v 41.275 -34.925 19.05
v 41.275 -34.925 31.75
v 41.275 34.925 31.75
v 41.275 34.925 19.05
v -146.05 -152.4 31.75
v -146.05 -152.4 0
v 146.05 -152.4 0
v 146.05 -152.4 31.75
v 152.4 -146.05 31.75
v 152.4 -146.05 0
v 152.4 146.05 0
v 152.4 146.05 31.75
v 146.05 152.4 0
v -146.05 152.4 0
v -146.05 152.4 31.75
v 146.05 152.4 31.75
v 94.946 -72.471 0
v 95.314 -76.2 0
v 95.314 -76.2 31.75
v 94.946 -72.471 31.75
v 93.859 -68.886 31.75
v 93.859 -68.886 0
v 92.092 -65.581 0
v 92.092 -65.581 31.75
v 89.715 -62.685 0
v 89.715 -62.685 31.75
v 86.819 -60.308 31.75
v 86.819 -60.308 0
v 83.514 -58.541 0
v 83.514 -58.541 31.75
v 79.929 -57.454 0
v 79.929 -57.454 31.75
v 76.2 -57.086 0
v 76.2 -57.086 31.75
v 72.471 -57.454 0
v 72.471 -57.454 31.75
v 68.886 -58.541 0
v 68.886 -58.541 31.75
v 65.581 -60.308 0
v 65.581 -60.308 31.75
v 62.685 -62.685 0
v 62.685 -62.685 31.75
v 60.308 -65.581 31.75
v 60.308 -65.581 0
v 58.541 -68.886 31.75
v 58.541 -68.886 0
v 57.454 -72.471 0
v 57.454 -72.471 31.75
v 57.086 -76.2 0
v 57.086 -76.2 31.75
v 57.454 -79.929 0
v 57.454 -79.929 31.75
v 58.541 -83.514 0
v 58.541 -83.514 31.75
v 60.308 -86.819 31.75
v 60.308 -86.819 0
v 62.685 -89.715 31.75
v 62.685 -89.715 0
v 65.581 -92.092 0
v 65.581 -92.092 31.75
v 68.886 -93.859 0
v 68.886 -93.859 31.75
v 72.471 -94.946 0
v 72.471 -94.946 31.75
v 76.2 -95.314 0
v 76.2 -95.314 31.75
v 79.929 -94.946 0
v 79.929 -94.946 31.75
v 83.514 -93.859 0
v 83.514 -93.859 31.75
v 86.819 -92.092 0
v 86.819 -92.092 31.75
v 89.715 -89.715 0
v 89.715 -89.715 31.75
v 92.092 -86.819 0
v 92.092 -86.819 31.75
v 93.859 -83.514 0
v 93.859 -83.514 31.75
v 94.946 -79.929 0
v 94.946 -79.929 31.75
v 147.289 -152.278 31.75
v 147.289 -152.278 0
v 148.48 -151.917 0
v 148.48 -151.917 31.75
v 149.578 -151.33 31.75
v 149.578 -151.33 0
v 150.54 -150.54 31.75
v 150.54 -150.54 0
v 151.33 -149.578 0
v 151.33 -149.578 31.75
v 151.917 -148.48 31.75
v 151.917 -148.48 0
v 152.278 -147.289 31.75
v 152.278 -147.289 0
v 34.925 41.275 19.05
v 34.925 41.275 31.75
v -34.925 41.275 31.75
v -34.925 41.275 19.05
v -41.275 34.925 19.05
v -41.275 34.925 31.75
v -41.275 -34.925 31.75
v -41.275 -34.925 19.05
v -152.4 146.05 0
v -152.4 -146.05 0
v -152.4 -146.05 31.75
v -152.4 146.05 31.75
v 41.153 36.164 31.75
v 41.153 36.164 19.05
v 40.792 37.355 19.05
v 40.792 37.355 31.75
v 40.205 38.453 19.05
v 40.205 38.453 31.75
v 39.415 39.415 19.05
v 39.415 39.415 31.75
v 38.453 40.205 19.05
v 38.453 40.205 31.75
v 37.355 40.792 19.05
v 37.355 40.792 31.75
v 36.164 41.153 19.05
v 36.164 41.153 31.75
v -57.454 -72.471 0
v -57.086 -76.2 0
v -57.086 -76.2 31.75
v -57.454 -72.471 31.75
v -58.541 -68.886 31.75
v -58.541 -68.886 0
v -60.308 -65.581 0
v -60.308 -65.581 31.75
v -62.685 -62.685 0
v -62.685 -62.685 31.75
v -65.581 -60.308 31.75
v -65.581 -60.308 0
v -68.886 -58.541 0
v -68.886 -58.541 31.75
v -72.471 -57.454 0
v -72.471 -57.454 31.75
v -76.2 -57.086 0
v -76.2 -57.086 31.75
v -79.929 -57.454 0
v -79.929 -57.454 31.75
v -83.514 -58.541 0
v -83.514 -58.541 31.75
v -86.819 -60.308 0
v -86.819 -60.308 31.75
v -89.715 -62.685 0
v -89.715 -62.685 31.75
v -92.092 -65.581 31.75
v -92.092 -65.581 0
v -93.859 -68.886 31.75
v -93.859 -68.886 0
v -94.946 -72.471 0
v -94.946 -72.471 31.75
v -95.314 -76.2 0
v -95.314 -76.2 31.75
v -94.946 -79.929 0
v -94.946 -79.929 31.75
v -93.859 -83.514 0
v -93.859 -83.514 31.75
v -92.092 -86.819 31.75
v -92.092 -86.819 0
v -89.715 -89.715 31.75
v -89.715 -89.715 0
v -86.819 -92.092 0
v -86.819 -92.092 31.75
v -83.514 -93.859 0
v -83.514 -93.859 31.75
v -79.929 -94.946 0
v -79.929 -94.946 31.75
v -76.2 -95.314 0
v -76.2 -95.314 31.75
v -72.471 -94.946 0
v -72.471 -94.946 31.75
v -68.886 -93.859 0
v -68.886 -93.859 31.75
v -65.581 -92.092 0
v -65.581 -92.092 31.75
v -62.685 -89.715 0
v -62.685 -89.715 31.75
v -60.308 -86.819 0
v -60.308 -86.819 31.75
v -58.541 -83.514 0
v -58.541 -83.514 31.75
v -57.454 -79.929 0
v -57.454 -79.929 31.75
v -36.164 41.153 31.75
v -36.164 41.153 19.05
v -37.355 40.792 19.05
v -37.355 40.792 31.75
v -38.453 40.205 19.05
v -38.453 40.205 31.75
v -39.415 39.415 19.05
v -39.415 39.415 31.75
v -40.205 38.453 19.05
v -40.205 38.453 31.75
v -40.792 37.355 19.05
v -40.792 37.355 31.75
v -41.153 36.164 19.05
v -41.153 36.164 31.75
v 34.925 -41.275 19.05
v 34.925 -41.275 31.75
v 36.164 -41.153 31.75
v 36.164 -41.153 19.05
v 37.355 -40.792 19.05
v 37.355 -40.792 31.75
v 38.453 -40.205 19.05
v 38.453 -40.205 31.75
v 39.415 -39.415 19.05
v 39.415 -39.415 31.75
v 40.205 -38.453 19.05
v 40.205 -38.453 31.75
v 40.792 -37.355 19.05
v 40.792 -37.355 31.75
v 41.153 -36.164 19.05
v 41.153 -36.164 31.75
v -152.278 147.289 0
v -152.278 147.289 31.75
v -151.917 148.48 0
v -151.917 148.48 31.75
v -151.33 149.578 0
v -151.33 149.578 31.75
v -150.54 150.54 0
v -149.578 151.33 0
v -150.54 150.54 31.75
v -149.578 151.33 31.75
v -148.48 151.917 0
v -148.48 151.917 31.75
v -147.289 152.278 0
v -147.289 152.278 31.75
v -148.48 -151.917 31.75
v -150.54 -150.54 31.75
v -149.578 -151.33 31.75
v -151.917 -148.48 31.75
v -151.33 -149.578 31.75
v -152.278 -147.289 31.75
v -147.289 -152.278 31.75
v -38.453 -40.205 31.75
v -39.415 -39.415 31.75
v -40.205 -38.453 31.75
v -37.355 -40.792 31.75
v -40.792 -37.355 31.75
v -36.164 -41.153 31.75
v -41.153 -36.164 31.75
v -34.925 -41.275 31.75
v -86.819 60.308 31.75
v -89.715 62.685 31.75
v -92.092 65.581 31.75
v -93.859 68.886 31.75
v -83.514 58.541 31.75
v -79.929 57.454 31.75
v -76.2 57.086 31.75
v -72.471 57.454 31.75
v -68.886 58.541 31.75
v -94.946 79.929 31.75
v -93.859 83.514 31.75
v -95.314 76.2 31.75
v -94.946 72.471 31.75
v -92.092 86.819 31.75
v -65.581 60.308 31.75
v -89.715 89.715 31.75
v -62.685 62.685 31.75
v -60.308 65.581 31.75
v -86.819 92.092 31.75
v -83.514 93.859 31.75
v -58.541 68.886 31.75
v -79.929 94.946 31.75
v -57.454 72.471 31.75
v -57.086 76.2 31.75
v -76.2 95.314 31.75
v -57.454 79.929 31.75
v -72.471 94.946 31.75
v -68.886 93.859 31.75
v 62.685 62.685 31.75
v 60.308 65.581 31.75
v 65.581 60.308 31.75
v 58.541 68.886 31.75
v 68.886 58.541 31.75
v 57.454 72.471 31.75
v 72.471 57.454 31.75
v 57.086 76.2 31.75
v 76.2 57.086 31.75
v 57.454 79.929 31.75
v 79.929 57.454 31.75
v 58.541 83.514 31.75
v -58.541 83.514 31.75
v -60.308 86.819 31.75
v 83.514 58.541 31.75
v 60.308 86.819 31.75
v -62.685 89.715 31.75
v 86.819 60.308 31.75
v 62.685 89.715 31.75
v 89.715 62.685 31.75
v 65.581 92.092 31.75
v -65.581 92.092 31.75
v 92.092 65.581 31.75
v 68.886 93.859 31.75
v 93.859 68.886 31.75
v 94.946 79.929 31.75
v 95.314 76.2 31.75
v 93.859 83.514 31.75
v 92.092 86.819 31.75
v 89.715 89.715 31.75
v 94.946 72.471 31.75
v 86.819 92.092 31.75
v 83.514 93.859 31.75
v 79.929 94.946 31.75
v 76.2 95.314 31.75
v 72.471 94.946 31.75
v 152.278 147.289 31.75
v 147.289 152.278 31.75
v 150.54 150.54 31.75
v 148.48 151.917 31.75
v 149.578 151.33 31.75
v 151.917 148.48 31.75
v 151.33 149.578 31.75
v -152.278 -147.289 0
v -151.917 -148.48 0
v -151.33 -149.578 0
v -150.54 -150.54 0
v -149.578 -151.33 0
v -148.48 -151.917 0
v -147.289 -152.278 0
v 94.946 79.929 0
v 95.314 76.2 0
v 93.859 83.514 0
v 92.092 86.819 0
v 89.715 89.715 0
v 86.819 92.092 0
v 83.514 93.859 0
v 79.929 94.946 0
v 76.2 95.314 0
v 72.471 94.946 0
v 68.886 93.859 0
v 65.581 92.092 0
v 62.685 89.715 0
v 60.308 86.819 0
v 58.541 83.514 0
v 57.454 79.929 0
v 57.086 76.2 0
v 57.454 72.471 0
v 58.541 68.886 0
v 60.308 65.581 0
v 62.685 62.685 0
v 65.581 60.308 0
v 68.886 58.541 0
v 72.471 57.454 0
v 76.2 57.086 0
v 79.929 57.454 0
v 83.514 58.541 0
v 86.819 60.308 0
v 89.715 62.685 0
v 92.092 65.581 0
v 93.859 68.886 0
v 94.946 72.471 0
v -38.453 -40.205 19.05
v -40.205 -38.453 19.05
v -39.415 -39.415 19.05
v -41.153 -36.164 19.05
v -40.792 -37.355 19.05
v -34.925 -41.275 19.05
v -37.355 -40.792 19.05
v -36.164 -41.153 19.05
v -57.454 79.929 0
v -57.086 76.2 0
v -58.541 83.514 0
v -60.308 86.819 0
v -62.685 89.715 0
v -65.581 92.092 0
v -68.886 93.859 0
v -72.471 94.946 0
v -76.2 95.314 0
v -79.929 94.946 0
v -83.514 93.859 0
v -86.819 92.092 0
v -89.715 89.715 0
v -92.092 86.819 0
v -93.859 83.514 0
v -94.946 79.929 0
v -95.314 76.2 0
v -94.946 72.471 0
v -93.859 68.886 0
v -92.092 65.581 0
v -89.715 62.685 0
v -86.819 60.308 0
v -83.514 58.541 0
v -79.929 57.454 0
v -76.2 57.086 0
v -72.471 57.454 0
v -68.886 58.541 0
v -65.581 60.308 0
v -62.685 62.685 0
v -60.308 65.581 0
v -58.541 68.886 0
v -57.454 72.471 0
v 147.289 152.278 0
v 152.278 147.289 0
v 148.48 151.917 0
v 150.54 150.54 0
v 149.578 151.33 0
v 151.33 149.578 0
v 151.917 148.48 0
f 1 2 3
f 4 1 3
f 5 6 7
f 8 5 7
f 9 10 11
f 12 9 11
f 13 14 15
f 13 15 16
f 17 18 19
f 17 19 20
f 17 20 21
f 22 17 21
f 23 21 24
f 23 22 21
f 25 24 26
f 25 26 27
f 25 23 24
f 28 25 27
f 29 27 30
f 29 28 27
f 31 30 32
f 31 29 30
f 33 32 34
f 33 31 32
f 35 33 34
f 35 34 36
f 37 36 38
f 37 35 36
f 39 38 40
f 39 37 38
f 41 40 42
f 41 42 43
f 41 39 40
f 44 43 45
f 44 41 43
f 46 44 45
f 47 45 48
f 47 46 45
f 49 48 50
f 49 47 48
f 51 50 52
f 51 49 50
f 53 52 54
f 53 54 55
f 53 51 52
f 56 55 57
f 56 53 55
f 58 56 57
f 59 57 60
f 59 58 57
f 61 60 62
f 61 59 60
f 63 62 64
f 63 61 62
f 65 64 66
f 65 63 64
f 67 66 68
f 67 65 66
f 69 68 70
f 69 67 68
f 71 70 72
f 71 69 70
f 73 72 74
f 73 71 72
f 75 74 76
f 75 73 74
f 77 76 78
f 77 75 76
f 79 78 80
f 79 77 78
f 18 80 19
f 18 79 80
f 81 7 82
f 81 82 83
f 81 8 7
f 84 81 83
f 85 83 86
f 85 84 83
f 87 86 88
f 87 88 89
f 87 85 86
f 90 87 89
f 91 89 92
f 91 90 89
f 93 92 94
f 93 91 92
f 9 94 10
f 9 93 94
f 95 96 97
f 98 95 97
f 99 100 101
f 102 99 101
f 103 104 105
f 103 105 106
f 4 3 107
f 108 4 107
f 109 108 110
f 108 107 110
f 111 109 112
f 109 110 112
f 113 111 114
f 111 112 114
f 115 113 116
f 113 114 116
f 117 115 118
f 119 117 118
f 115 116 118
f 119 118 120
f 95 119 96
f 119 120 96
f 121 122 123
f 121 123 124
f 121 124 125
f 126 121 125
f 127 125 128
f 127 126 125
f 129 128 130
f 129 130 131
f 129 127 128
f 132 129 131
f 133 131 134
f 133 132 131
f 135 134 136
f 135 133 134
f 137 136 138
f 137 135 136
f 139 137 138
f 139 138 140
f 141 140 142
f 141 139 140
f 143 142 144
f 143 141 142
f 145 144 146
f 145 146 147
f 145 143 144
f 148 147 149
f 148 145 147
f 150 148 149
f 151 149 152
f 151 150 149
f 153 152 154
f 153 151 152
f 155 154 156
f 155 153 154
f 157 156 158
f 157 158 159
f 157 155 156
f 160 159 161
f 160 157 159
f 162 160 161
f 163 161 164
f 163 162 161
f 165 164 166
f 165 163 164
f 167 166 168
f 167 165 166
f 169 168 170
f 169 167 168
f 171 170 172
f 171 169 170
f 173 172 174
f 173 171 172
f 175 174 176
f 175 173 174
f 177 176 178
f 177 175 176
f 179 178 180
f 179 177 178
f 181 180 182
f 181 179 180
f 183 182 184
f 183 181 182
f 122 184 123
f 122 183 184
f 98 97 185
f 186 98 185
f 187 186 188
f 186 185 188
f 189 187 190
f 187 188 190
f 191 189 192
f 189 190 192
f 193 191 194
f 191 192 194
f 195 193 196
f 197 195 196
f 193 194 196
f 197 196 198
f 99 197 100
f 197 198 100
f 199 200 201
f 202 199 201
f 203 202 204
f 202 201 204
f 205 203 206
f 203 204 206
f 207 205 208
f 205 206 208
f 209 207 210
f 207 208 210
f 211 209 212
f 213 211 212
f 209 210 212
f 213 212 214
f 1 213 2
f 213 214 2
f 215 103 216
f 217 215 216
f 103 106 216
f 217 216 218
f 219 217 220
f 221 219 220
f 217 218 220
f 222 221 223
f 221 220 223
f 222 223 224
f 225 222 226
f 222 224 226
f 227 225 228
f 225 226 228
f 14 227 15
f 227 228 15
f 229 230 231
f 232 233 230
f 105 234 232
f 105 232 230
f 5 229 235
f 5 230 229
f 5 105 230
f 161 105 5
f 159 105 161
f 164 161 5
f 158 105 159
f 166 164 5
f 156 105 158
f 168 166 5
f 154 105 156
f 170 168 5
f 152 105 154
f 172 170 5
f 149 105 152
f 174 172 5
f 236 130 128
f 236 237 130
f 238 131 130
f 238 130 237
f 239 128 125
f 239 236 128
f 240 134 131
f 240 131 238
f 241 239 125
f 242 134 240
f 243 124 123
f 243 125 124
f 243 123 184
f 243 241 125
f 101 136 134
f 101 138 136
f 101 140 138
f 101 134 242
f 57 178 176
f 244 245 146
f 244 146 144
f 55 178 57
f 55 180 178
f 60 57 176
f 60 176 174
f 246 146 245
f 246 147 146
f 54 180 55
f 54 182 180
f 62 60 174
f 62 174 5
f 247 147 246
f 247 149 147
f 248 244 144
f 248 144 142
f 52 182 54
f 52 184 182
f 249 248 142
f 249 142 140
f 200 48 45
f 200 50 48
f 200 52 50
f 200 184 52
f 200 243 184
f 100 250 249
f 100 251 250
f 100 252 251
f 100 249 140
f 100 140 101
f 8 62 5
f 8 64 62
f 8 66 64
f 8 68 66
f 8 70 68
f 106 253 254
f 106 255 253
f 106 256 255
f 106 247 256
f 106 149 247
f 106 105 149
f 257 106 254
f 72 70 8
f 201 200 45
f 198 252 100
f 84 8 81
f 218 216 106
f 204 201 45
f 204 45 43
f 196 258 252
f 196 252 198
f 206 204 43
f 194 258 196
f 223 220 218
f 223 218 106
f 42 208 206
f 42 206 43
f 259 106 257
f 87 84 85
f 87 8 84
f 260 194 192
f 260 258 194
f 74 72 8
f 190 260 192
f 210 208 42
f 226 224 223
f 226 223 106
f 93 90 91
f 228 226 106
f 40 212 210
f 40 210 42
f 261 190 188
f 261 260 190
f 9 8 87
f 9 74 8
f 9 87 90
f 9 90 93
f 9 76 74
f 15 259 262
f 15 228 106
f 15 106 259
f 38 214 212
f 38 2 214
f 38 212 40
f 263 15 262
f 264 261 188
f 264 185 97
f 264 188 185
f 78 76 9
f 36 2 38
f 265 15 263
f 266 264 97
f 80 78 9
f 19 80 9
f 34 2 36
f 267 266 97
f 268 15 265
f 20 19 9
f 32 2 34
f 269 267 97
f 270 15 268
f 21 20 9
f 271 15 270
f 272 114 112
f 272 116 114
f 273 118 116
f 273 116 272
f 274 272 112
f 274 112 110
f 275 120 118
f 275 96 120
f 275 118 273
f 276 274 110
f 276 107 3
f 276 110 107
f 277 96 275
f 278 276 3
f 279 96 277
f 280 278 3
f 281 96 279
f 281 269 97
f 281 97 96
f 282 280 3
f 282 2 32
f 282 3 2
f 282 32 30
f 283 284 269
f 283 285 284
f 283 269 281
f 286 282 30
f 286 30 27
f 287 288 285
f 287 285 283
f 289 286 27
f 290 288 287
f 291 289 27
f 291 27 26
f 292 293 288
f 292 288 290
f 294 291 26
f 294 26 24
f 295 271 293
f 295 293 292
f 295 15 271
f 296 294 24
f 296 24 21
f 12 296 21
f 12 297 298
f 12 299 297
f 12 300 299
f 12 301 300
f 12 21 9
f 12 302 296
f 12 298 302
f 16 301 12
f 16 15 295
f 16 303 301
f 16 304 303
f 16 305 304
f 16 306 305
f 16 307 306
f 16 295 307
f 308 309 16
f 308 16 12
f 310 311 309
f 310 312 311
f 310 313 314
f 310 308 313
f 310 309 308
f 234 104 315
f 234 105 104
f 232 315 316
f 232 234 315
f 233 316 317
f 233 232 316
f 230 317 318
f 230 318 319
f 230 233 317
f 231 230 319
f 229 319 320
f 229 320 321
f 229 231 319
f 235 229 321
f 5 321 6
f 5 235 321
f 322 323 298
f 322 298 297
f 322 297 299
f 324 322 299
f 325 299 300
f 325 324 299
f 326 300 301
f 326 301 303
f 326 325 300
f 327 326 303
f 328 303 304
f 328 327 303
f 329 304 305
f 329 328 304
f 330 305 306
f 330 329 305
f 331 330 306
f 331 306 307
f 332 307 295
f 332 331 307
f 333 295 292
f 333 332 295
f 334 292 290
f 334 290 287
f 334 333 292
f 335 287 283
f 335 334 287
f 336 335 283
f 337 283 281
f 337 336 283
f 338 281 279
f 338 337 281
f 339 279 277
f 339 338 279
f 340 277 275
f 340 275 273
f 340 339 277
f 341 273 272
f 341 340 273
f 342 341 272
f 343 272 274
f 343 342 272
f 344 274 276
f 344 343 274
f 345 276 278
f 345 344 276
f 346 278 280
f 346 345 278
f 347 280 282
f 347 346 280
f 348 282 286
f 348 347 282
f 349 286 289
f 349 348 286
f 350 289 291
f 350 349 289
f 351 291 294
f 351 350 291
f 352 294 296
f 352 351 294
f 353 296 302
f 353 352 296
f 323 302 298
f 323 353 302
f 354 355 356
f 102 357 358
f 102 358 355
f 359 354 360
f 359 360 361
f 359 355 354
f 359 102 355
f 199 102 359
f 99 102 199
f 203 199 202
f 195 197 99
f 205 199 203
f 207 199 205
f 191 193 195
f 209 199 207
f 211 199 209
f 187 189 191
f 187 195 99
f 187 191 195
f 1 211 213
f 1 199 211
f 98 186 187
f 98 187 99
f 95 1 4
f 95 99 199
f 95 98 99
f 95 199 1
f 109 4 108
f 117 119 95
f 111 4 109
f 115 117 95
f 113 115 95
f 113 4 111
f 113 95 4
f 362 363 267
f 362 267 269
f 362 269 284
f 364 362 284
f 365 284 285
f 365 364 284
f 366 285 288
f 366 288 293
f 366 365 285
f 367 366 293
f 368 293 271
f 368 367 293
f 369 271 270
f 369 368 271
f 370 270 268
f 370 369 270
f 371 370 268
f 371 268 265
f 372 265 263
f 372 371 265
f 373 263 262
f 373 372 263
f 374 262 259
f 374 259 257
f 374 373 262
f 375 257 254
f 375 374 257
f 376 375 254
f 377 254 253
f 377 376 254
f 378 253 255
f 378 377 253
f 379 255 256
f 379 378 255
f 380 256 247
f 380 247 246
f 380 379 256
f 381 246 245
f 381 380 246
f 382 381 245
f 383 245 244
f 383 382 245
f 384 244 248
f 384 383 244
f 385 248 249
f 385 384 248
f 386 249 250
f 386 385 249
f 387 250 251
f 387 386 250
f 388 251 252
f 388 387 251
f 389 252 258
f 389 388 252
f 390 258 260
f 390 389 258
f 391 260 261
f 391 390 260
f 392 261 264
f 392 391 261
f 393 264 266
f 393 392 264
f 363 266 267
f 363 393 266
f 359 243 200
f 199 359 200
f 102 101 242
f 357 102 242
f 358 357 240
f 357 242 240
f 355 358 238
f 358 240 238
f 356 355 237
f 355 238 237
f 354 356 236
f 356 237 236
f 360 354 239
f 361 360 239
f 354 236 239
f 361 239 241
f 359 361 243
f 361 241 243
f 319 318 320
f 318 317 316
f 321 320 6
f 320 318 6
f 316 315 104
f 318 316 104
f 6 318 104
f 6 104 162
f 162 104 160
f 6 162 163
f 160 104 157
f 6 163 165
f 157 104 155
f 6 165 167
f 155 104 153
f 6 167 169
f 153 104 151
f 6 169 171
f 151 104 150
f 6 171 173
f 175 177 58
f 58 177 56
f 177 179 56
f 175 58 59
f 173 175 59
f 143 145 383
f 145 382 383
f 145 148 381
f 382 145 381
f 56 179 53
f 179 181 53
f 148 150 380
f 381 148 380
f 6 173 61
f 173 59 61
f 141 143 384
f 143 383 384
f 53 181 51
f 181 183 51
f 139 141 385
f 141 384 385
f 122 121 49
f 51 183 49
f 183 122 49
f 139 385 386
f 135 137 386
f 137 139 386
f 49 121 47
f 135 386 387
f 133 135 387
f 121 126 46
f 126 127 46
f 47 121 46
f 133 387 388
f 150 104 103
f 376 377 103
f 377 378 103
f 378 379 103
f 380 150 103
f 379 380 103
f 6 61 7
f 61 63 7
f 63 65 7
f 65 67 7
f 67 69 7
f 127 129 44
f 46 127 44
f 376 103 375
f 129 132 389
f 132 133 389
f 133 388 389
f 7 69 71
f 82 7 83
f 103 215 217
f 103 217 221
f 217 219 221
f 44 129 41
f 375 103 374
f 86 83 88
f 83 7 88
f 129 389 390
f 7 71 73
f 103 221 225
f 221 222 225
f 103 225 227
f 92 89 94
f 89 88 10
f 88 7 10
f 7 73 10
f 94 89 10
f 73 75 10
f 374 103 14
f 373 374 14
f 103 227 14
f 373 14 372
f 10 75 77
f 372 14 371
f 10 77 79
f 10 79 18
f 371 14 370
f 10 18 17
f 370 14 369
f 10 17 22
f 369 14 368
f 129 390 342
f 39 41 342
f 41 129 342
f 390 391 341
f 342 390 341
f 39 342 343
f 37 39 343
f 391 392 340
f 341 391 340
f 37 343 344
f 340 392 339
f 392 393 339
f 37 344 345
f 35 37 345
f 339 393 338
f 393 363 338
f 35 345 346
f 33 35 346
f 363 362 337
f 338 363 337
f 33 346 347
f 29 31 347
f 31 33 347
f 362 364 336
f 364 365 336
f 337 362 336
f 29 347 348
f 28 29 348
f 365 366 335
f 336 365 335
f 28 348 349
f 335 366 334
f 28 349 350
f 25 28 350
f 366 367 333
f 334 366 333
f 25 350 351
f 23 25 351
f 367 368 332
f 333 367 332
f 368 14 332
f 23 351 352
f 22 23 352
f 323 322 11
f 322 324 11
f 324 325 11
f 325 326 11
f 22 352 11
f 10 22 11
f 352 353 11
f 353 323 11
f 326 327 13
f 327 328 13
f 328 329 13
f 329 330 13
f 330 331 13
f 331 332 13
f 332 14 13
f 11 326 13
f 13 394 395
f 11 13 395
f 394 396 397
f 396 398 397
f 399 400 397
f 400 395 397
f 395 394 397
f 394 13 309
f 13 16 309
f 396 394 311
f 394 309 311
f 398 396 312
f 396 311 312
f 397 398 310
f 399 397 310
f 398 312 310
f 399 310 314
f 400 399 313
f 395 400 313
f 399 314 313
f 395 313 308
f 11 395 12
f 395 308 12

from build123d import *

# Parameters (mm, degrees)
F0_W     = 304.8
F0_H     = 304.8
F0_R     = 19.1135
F1_DEPTH = 31.75
F3_DEPTH = 12.7
F4_R     = 6.35


with BuildPart() as f1:
    # F0 (on Top) → F1 (new body)
    with BuildSketch(Plane.XY):
        Rectangle(F0_W, F0_H)
        with Locations((-76.2, -76.2)):
            Circle(F0_R, mode=Mode.SUBTRACT)
        with Locations((76.2, -76.2)):
            Circle(F0_R, mode=Mode.SUBTRACT)
        with Locations((-76.2, 76.2)):
            Circle(F0_R, mode=Mode.SUBTRACT)
        with Locations((76.2, 76.2)):
            Circle(F0_R, mode=Mode.SUBTRACT)
    extrude(amount=F1_DEPTH)

    # F2 (on face) → F3 (cut)
    with BuildSketch(Plane.XY.offset(31.75)):
        with BuildLine():
            ThreePointArc((41.275, 34.925), (39.415128, 39.415128), (34.925, 41.275))
            Line((34.925, 41.275), (-34.925, 41.275))
            ThreePointArc((-34.925, 41.275), (-39.415128, 39.415128), (-41.275, 34.925))
            Line((-41.275, 34.925), (-41.275, -34.925))
            ThreePointArc((-41.275, -34.925), (-39.415128, -39.415128), (-34.925, -41.275))
            Line((-34.925, -41.275), (34.925, -41.275))
            ThreePointArc((34.925, -41.275), (39.415128, -39.415128), (41.275, -34.925))
            Line((41.275, -34.925), (41.275, 34.925))
        make_face()
    extrude(amount=-F3_DEPTH, mode=Mode.SUBTRACT)

    # F4
    f4_edges = [f1.edges().sort_by_distance(p)[0] for p in [
        (152.4, 152.4, 15.875),
        (152.4, -152.4, 15.875),
        (-152.4, 152.4, 15.875),
        (-152.4, -152.4, 15.875),
    ]]
    fillet(f4_edges, radius=F4_R)


solid = f1.part
